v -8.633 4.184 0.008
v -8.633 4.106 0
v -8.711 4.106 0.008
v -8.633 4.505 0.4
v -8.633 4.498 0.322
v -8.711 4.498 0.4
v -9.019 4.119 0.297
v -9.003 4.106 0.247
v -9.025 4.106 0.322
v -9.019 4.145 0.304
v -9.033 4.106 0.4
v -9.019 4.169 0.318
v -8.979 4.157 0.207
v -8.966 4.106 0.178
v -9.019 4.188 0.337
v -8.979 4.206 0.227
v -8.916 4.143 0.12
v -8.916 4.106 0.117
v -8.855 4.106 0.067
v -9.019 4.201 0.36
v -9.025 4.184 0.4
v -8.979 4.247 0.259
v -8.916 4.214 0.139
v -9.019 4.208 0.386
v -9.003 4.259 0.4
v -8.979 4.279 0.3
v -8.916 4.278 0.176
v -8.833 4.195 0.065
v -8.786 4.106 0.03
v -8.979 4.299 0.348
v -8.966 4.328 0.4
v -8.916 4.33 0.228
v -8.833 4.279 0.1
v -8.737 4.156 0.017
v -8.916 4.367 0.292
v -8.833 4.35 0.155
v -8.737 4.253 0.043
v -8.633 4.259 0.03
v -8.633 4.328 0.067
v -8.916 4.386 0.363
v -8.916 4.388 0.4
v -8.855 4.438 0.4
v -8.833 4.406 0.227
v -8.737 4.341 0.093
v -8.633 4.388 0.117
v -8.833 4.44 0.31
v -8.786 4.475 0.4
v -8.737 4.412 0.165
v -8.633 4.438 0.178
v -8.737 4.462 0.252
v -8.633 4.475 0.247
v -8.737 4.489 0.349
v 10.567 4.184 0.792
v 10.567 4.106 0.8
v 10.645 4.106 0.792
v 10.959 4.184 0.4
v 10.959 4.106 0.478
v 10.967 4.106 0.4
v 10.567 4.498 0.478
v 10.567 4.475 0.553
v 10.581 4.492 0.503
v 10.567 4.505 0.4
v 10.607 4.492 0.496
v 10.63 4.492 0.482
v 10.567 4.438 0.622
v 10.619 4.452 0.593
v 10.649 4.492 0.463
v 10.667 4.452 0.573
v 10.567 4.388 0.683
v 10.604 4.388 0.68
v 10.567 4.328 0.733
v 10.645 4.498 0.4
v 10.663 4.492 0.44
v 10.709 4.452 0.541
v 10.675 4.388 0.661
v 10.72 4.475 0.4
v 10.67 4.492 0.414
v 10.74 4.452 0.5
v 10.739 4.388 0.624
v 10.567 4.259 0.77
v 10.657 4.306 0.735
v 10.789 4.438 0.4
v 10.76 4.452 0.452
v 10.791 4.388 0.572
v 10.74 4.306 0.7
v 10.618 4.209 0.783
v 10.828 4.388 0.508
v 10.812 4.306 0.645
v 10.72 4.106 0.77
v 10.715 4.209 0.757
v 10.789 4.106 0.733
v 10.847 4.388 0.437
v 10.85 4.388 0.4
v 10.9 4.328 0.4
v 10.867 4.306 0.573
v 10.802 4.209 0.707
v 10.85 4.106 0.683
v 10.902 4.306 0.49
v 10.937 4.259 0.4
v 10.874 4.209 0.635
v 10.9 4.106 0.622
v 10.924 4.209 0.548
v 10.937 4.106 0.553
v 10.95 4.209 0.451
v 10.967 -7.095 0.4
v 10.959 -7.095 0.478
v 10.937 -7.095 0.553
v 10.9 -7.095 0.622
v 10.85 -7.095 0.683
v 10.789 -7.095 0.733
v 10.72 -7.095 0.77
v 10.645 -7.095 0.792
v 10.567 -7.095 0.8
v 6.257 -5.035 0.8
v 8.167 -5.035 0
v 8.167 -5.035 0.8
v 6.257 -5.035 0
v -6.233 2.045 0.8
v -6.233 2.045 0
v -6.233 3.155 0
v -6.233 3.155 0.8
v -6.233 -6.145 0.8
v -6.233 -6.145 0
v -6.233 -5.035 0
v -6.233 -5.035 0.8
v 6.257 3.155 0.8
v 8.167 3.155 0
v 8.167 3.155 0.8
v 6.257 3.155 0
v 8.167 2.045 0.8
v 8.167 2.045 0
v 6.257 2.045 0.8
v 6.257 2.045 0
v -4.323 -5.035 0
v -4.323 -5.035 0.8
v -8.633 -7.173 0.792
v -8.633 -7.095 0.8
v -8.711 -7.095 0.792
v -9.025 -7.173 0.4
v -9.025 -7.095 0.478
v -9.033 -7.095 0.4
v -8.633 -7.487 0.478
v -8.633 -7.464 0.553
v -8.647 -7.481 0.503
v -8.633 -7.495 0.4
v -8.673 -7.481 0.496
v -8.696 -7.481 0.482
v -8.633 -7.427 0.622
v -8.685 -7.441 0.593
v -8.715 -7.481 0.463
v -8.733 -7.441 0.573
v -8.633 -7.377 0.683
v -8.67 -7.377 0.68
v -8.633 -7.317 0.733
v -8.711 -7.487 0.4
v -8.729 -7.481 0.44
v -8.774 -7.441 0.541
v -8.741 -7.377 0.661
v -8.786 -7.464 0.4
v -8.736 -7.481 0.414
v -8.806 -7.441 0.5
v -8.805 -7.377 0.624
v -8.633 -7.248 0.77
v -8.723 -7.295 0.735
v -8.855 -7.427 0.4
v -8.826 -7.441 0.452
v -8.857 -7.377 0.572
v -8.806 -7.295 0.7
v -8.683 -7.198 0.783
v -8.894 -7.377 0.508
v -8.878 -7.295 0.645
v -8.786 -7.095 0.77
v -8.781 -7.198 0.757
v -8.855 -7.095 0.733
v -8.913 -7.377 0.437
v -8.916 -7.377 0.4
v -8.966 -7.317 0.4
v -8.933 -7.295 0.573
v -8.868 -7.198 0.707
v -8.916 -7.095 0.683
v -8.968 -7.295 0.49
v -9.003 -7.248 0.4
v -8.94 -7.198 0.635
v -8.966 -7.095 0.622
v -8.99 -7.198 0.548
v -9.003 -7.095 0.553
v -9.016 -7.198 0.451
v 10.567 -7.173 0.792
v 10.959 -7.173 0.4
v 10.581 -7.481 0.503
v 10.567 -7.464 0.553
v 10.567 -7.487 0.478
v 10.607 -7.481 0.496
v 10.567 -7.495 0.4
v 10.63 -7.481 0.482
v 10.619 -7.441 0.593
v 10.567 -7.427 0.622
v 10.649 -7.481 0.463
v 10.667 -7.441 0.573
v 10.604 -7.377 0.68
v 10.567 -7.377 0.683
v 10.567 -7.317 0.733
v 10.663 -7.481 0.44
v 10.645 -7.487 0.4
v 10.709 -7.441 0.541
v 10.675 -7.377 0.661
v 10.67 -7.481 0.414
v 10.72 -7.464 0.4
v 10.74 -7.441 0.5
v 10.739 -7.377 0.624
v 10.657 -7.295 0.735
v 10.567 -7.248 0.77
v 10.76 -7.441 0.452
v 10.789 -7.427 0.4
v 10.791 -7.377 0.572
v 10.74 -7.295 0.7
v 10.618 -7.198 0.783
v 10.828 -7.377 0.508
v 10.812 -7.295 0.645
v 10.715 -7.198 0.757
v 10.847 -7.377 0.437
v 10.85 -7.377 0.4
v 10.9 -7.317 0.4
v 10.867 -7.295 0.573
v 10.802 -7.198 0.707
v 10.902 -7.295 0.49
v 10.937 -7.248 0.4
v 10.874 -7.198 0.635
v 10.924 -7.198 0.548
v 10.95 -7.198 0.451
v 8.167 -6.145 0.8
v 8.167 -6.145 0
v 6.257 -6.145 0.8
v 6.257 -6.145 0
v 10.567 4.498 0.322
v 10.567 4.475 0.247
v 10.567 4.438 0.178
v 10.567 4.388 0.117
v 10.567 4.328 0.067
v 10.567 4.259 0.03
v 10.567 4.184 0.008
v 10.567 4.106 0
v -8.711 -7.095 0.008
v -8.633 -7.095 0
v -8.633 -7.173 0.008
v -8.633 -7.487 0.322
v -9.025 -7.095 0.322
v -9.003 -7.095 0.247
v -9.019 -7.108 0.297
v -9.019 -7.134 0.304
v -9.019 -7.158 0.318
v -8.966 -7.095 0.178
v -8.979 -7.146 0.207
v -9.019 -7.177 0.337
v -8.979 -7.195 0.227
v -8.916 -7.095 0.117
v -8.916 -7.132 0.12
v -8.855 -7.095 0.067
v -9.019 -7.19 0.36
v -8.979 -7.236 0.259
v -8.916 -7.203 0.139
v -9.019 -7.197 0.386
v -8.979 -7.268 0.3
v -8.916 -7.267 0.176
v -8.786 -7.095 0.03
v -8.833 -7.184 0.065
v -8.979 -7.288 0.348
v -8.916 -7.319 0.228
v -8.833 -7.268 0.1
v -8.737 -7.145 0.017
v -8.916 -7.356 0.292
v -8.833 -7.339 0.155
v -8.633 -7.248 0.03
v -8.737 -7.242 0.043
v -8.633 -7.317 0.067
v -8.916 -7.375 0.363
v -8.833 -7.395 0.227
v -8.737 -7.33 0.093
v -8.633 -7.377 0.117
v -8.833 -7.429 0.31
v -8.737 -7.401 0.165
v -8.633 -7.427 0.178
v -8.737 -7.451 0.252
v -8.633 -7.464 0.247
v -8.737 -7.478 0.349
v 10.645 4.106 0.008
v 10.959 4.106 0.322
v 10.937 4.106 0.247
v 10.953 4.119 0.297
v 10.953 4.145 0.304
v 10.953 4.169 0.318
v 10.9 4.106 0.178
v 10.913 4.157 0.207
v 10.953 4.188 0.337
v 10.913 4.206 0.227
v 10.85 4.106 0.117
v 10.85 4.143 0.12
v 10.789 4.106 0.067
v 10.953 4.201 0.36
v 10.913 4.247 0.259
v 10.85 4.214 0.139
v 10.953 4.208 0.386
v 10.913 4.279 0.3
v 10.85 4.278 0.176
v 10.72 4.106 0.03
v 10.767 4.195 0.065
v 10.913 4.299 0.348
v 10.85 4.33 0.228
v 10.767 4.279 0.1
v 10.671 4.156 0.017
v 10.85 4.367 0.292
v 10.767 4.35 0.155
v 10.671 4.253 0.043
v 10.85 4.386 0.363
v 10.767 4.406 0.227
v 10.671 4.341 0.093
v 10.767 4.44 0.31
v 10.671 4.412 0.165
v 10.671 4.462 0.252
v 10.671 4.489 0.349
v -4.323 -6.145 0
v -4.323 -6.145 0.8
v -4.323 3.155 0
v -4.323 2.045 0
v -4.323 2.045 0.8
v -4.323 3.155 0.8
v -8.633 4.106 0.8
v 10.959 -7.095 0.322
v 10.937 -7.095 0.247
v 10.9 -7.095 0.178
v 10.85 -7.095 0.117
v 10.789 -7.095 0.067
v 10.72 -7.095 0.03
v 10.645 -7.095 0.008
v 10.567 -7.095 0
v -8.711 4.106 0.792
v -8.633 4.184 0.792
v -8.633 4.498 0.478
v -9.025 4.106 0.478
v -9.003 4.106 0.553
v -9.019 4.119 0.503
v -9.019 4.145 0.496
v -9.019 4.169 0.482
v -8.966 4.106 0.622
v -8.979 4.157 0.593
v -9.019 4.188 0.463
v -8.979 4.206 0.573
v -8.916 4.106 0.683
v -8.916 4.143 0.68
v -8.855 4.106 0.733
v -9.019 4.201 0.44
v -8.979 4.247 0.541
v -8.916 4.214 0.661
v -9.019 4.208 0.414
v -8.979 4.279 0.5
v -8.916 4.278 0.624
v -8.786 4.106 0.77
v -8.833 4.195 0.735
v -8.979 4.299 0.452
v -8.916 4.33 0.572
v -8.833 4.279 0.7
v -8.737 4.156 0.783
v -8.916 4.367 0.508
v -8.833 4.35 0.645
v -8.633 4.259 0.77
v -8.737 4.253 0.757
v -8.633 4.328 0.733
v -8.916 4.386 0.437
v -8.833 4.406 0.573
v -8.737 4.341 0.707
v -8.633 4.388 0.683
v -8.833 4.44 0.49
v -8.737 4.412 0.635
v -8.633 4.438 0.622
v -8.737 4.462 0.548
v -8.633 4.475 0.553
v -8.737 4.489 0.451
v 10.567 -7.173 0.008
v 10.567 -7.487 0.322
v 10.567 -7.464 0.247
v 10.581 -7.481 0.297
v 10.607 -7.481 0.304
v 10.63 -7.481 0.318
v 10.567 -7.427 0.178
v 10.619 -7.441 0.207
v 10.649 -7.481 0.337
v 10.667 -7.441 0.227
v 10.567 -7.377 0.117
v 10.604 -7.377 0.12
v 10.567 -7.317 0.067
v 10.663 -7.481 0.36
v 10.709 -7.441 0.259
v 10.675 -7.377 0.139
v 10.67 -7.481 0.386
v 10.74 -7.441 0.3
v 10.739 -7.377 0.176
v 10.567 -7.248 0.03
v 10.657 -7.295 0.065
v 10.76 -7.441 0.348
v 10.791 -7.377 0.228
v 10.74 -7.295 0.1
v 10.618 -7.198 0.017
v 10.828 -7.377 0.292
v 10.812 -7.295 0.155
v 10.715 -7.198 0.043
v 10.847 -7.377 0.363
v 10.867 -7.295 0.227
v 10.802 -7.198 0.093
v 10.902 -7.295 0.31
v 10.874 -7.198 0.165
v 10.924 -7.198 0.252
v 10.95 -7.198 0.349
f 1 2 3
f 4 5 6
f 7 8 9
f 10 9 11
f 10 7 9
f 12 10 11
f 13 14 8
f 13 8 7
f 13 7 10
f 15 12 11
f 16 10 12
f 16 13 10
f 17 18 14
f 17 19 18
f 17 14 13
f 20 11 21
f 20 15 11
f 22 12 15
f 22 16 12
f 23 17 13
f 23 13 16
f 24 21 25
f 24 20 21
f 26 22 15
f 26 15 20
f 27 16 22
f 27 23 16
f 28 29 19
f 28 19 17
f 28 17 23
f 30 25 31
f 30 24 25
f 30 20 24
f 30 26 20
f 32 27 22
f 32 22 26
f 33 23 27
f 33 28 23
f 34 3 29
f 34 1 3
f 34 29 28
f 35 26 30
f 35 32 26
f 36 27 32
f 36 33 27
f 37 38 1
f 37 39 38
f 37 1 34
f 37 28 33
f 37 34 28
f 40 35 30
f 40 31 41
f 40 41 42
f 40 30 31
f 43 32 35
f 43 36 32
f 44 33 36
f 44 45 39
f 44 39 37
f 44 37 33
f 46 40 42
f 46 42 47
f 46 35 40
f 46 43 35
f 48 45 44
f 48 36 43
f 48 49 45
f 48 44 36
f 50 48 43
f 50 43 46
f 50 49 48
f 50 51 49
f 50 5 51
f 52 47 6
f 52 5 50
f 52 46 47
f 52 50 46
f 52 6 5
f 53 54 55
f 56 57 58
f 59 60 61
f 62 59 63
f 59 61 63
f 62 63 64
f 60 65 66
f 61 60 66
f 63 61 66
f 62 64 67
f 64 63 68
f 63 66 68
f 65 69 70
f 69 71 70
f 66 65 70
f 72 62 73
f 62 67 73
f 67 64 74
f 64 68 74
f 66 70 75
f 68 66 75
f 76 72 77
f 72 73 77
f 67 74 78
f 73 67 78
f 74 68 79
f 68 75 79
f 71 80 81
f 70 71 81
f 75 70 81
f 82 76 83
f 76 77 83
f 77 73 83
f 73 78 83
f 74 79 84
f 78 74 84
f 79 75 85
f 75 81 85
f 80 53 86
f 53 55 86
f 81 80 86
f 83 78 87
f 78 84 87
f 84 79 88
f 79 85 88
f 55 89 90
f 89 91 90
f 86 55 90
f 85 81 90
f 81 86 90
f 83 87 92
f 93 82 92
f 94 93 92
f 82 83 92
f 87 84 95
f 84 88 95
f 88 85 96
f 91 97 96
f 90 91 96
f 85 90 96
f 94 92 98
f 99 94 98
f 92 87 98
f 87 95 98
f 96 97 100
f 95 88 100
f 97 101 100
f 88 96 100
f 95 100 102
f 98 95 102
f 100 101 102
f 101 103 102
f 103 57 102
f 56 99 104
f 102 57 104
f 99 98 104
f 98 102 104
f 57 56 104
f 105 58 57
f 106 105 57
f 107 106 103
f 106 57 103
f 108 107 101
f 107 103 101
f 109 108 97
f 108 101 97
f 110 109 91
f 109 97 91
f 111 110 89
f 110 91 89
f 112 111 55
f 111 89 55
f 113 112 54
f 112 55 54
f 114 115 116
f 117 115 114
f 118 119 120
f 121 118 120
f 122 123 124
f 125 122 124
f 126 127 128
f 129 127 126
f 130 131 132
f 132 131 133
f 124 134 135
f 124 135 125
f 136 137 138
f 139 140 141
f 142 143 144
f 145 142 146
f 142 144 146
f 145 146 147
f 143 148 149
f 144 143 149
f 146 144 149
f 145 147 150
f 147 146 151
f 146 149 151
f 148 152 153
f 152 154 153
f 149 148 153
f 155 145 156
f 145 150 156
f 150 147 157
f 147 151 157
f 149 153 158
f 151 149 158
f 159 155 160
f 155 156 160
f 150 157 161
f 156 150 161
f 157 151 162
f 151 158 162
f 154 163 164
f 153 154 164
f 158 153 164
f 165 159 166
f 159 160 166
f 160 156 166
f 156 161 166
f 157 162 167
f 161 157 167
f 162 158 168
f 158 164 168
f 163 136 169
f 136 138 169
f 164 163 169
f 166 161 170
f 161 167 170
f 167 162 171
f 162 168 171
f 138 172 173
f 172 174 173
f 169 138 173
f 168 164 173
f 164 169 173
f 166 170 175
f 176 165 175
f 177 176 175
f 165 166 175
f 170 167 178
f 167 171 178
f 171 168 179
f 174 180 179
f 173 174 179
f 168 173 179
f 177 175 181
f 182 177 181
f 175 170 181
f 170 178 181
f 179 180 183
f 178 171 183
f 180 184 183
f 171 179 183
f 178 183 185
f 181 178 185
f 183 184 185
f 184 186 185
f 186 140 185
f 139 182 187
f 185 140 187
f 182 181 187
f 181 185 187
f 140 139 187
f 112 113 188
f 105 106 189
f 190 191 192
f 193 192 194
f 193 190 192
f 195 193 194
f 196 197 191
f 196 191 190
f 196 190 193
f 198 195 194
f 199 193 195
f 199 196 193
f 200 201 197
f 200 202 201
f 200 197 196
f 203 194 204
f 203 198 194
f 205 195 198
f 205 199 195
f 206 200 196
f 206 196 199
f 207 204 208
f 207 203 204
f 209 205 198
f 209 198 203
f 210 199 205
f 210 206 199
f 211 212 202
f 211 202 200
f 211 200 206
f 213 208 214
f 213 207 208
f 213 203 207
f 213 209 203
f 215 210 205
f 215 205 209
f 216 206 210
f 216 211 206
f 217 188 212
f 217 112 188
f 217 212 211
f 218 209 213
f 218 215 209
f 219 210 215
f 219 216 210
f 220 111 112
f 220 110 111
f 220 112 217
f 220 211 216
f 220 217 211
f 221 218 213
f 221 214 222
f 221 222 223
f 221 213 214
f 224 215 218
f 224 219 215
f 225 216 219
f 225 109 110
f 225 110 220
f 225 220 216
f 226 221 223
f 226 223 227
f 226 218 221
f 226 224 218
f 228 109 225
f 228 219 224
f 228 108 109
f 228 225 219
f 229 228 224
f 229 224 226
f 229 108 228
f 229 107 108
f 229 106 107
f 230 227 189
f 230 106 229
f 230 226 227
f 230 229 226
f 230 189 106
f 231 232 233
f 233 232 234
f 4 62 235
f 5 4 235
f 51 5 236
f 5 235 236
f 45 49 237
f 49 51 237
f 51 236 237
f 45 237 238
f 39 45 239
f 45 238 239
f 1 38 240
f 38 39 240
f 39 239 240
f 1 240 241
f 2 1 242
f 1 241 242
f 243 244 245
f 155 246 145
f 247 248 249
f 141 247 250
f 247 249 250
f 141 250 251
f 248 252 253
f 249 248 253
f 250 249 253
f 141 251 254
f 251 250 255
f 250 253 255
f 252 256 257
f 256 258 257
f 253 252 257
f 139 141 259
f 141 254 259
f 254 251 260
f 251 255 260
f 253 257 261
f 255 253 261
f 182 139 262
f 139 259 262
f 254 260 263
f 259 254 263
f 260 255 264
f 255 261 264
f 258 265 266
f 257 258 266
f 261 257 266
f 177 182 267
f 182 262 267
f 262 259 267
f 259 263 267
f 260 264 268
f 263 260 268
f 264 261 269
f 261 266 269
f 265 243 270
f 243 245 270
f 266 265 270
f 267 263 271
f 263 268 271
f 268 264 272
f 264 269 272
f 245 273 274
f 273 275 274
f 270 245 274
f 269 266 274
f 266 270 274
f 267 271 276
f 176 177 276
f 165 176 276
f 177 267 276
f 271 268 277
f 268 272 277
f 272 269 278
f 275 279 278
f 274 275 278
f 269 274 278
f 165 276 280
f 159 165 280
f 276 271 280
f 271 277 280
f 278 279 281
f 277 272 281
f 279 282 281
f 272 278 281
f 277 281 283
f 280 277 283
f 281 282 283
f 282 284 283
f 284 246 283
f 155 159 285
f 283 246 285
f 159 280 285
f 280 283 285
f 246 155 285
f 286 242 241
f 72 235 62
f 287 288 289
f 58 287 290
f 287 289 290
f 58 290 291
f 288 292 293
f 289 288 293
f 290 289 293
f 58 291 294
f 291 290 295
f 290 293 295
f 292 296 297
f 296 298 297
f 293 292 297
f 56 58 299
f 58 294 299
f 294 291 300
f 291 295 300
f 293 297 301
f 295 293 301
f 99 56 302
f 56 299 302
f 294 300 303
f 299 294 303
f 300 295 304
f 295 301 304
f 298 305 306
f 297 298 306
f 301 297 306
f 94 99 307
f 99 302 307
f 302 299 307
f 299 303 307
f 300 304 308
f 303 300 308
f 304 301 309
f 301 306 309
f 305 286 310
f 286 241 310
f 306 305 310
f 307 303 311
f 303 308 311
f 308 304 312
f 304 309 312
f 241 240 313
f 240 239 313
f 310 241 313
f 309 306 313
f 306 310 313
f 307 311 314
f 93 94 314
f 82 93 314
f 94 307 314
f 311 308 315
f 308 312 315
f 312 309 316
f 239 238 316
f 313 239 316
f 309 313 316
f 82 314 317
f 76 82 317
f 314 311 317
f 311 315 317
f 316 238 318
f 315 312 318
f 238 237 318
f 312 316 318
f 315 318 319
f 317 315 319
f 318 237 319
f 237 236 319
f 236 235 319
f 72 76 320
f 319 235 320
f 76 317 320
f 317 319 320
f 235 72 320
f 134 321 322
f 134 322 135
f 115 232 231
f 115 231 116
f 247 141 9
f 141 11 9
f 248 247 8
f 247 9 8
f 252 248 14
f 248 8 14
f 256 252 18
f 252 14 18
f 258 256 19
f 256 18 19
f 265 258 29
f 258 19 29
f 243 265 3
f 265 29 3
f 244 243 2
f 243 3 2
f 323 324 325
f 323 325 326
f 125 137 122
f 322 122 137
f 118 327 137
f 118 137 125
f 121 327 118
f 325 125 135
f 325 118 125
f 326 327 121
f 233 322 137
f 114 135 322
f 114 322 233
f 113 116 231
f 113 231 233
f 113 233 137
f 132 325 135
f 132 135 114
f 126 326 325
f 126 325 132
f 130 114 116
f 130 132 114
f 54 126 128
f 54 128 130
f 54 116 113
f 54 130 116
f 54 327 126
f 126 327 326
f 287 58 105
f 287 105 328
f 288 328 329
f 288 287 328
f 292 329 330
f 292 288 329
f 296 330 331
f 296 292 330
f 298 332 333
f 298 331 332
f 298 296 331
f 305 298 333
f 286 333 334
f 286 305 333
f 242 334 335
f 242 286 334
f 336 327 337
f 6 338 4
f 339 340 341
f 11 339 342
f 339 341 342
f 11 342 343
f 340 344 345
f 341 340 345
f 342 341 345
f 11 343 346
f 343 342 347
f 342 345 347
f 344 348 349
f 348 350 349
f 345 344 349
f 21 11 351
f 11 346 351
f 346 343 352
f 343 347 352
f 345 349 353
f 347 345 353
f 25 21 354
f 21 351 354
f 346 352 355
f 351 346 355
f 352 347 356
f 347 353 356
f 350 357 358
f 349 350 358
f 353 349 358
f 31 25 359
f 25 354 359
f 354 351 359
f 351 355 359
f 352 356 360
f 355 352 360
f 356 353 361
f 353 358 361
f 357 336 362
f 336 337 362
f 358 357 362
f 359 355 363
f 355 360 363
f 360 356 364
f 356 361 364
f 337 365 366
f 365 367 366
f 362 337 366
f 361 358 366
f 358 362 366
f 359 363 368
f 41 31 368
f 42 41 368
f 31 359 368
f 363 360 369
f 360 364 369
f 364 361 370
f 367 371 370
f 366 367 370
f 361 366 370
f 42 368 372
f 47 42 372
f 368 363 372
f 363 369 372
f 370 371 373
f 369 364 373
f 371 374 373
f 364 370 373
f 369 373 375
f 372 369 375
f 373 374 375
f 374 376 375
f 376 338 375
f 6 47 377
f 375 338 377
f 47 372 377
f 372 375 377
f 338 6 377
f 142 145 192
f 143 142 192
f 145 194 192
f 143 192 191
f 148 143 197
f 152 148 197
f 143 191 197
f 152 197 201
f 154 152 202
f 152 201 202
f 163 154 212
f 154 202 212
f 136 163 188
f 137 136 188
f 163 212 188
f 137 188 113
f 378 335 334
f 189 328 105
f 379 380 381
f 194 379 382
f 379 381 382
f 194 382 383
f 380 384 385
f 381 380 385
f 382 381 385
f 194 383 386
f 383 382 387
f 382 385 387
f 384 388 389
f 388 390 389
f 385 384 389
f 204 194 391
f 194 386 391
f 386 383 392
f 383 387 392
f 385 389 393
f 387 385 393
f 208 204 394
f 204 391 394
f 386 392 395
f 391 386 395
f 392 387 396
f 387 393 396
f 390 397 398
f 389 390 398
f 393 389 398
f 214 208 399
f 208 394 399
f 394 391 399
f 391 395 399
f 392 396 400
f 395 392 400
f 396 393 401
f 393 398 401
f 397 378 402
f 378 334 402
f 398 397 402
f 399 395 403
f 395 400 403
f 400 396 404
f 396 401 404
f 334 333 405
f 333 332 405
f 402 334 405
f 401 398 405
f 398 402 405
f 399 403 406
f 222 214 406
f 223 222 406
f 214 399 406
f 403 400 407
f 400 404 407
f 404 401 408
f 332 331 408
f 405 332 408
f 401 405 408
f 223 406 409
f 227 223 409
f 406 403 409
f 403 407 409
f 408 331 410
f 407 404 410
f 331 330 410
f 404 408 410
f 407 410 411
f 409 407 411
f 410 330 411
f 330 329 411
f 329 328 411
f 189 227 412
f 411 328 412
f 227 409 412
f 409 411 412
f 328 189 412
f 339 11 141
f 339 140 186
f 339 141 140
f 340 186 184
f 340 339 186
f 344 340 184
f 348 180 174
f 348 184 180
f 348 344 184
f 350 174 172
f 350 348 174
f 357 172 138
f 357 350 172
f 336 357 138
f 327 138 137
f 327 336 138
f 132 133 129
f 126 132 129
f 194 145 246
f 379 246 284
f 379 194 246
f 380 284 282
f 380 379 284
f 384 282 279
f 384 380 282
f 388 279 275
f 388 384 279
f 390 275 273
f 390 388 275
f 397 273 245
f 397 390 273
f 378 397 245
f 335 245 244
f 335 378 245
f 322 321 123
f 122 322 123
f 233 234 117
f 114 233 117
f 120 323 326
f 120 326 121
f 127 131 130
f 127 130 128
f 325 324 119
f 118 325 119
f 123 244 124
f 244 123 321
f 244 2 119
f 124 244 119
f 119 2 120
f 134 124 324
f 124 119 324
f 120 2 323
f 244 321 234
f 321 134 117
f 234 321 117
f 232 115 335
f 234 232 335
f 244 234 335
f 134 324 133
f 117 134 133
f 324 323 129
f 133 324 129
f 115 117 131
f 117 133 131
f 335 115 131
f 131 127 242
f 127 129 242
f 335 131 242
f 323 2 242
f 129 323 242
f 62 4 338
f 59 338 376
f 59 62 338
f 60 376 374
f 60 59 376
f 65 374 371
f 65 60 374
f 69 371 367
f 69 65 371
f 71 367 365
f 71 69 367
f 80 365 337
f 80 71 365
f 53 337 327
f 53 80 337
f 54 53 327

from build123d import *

# Parameters (mm, degrees)
SKETCH_1_W          = 20
SKETCH_1_H          = 12
EXTRUDE_1_DEPTH     = 0.8
FILLET_2_R          = 0.4
SKETCH_2_W          = 1.91
SKETCH_2_H          = 1.11
CUT_EXTRUDE_1_DEPTH = 14.307269619


with BuildPart() as part:
    # 草图1 → 凸台-拉伸1 (new body)
    with BuildSketch(Plane.XY):
        with Locations((0.967032967, -1.494505495)):
            Rectangle(SKETCH_1_W, SKETCH_1_H)
    extrude(amount=EXTRUDE_1_DEPTH)

    # 圆角2
    fillet_2_edges = [part.edges().sort_by_distance(p)[0] for p in [
        (10.967032967, -1.494505495, 0.8),
        (0.967032967, 4.505494505, 0.8),
        (-9.032967033, -1.494505495, 0.8),
        (0.967032967, 4.505494505, 0),
        (10.967032967, -1.494505495, 0),
        (0.967032967, -7.494505495, 0),
        (-9.032967033, -1.494505495, 0),
        (0.967032967, -7.494505495, 0.8),
        (-9.032967033, 4.505494505, 0.4),
        (10.967032967, 4.505494505, 0.4),
        (10.967032967, -7.494505495, 0.4),
        (-9.032967033, -7.494505495, 0.4),
    ]]
    fillet(fillet_2_edges, radius=FILLET_2_R - 0.0001)  # a hair under: the kernel refuses the full size

    # 草图2 → 切除-拉伸1 (cut, through all)
    with BuildSketch(Plane(origin=(0, 0, 0), x_dir=(-1, 0, 0), z_dir=(0, 0, -1))):
        with Locations((-7.212032967, 2.600494505)):
            Rectangle(SKETCH_2_W, SKETCH_2_H)
        with Locations((-7.212032967, -5.589505495)):
            Rectangle(SKETCH_2_W, SKETCH_2_H)
        with Locations((5.277967033, 2.600494505)):
            Rectangle(SKETCH_2_W, SKETCH_2_H)
        with Locations((5.277967033, -5.589505495)):
            Rectangle(SKETCH_2_W, SKETCH_2_H)
    extrude(amount=-CUT_EXTRUDE_1_DEPTH, mode=Mode.SUBTRACT)


solid = part.part
